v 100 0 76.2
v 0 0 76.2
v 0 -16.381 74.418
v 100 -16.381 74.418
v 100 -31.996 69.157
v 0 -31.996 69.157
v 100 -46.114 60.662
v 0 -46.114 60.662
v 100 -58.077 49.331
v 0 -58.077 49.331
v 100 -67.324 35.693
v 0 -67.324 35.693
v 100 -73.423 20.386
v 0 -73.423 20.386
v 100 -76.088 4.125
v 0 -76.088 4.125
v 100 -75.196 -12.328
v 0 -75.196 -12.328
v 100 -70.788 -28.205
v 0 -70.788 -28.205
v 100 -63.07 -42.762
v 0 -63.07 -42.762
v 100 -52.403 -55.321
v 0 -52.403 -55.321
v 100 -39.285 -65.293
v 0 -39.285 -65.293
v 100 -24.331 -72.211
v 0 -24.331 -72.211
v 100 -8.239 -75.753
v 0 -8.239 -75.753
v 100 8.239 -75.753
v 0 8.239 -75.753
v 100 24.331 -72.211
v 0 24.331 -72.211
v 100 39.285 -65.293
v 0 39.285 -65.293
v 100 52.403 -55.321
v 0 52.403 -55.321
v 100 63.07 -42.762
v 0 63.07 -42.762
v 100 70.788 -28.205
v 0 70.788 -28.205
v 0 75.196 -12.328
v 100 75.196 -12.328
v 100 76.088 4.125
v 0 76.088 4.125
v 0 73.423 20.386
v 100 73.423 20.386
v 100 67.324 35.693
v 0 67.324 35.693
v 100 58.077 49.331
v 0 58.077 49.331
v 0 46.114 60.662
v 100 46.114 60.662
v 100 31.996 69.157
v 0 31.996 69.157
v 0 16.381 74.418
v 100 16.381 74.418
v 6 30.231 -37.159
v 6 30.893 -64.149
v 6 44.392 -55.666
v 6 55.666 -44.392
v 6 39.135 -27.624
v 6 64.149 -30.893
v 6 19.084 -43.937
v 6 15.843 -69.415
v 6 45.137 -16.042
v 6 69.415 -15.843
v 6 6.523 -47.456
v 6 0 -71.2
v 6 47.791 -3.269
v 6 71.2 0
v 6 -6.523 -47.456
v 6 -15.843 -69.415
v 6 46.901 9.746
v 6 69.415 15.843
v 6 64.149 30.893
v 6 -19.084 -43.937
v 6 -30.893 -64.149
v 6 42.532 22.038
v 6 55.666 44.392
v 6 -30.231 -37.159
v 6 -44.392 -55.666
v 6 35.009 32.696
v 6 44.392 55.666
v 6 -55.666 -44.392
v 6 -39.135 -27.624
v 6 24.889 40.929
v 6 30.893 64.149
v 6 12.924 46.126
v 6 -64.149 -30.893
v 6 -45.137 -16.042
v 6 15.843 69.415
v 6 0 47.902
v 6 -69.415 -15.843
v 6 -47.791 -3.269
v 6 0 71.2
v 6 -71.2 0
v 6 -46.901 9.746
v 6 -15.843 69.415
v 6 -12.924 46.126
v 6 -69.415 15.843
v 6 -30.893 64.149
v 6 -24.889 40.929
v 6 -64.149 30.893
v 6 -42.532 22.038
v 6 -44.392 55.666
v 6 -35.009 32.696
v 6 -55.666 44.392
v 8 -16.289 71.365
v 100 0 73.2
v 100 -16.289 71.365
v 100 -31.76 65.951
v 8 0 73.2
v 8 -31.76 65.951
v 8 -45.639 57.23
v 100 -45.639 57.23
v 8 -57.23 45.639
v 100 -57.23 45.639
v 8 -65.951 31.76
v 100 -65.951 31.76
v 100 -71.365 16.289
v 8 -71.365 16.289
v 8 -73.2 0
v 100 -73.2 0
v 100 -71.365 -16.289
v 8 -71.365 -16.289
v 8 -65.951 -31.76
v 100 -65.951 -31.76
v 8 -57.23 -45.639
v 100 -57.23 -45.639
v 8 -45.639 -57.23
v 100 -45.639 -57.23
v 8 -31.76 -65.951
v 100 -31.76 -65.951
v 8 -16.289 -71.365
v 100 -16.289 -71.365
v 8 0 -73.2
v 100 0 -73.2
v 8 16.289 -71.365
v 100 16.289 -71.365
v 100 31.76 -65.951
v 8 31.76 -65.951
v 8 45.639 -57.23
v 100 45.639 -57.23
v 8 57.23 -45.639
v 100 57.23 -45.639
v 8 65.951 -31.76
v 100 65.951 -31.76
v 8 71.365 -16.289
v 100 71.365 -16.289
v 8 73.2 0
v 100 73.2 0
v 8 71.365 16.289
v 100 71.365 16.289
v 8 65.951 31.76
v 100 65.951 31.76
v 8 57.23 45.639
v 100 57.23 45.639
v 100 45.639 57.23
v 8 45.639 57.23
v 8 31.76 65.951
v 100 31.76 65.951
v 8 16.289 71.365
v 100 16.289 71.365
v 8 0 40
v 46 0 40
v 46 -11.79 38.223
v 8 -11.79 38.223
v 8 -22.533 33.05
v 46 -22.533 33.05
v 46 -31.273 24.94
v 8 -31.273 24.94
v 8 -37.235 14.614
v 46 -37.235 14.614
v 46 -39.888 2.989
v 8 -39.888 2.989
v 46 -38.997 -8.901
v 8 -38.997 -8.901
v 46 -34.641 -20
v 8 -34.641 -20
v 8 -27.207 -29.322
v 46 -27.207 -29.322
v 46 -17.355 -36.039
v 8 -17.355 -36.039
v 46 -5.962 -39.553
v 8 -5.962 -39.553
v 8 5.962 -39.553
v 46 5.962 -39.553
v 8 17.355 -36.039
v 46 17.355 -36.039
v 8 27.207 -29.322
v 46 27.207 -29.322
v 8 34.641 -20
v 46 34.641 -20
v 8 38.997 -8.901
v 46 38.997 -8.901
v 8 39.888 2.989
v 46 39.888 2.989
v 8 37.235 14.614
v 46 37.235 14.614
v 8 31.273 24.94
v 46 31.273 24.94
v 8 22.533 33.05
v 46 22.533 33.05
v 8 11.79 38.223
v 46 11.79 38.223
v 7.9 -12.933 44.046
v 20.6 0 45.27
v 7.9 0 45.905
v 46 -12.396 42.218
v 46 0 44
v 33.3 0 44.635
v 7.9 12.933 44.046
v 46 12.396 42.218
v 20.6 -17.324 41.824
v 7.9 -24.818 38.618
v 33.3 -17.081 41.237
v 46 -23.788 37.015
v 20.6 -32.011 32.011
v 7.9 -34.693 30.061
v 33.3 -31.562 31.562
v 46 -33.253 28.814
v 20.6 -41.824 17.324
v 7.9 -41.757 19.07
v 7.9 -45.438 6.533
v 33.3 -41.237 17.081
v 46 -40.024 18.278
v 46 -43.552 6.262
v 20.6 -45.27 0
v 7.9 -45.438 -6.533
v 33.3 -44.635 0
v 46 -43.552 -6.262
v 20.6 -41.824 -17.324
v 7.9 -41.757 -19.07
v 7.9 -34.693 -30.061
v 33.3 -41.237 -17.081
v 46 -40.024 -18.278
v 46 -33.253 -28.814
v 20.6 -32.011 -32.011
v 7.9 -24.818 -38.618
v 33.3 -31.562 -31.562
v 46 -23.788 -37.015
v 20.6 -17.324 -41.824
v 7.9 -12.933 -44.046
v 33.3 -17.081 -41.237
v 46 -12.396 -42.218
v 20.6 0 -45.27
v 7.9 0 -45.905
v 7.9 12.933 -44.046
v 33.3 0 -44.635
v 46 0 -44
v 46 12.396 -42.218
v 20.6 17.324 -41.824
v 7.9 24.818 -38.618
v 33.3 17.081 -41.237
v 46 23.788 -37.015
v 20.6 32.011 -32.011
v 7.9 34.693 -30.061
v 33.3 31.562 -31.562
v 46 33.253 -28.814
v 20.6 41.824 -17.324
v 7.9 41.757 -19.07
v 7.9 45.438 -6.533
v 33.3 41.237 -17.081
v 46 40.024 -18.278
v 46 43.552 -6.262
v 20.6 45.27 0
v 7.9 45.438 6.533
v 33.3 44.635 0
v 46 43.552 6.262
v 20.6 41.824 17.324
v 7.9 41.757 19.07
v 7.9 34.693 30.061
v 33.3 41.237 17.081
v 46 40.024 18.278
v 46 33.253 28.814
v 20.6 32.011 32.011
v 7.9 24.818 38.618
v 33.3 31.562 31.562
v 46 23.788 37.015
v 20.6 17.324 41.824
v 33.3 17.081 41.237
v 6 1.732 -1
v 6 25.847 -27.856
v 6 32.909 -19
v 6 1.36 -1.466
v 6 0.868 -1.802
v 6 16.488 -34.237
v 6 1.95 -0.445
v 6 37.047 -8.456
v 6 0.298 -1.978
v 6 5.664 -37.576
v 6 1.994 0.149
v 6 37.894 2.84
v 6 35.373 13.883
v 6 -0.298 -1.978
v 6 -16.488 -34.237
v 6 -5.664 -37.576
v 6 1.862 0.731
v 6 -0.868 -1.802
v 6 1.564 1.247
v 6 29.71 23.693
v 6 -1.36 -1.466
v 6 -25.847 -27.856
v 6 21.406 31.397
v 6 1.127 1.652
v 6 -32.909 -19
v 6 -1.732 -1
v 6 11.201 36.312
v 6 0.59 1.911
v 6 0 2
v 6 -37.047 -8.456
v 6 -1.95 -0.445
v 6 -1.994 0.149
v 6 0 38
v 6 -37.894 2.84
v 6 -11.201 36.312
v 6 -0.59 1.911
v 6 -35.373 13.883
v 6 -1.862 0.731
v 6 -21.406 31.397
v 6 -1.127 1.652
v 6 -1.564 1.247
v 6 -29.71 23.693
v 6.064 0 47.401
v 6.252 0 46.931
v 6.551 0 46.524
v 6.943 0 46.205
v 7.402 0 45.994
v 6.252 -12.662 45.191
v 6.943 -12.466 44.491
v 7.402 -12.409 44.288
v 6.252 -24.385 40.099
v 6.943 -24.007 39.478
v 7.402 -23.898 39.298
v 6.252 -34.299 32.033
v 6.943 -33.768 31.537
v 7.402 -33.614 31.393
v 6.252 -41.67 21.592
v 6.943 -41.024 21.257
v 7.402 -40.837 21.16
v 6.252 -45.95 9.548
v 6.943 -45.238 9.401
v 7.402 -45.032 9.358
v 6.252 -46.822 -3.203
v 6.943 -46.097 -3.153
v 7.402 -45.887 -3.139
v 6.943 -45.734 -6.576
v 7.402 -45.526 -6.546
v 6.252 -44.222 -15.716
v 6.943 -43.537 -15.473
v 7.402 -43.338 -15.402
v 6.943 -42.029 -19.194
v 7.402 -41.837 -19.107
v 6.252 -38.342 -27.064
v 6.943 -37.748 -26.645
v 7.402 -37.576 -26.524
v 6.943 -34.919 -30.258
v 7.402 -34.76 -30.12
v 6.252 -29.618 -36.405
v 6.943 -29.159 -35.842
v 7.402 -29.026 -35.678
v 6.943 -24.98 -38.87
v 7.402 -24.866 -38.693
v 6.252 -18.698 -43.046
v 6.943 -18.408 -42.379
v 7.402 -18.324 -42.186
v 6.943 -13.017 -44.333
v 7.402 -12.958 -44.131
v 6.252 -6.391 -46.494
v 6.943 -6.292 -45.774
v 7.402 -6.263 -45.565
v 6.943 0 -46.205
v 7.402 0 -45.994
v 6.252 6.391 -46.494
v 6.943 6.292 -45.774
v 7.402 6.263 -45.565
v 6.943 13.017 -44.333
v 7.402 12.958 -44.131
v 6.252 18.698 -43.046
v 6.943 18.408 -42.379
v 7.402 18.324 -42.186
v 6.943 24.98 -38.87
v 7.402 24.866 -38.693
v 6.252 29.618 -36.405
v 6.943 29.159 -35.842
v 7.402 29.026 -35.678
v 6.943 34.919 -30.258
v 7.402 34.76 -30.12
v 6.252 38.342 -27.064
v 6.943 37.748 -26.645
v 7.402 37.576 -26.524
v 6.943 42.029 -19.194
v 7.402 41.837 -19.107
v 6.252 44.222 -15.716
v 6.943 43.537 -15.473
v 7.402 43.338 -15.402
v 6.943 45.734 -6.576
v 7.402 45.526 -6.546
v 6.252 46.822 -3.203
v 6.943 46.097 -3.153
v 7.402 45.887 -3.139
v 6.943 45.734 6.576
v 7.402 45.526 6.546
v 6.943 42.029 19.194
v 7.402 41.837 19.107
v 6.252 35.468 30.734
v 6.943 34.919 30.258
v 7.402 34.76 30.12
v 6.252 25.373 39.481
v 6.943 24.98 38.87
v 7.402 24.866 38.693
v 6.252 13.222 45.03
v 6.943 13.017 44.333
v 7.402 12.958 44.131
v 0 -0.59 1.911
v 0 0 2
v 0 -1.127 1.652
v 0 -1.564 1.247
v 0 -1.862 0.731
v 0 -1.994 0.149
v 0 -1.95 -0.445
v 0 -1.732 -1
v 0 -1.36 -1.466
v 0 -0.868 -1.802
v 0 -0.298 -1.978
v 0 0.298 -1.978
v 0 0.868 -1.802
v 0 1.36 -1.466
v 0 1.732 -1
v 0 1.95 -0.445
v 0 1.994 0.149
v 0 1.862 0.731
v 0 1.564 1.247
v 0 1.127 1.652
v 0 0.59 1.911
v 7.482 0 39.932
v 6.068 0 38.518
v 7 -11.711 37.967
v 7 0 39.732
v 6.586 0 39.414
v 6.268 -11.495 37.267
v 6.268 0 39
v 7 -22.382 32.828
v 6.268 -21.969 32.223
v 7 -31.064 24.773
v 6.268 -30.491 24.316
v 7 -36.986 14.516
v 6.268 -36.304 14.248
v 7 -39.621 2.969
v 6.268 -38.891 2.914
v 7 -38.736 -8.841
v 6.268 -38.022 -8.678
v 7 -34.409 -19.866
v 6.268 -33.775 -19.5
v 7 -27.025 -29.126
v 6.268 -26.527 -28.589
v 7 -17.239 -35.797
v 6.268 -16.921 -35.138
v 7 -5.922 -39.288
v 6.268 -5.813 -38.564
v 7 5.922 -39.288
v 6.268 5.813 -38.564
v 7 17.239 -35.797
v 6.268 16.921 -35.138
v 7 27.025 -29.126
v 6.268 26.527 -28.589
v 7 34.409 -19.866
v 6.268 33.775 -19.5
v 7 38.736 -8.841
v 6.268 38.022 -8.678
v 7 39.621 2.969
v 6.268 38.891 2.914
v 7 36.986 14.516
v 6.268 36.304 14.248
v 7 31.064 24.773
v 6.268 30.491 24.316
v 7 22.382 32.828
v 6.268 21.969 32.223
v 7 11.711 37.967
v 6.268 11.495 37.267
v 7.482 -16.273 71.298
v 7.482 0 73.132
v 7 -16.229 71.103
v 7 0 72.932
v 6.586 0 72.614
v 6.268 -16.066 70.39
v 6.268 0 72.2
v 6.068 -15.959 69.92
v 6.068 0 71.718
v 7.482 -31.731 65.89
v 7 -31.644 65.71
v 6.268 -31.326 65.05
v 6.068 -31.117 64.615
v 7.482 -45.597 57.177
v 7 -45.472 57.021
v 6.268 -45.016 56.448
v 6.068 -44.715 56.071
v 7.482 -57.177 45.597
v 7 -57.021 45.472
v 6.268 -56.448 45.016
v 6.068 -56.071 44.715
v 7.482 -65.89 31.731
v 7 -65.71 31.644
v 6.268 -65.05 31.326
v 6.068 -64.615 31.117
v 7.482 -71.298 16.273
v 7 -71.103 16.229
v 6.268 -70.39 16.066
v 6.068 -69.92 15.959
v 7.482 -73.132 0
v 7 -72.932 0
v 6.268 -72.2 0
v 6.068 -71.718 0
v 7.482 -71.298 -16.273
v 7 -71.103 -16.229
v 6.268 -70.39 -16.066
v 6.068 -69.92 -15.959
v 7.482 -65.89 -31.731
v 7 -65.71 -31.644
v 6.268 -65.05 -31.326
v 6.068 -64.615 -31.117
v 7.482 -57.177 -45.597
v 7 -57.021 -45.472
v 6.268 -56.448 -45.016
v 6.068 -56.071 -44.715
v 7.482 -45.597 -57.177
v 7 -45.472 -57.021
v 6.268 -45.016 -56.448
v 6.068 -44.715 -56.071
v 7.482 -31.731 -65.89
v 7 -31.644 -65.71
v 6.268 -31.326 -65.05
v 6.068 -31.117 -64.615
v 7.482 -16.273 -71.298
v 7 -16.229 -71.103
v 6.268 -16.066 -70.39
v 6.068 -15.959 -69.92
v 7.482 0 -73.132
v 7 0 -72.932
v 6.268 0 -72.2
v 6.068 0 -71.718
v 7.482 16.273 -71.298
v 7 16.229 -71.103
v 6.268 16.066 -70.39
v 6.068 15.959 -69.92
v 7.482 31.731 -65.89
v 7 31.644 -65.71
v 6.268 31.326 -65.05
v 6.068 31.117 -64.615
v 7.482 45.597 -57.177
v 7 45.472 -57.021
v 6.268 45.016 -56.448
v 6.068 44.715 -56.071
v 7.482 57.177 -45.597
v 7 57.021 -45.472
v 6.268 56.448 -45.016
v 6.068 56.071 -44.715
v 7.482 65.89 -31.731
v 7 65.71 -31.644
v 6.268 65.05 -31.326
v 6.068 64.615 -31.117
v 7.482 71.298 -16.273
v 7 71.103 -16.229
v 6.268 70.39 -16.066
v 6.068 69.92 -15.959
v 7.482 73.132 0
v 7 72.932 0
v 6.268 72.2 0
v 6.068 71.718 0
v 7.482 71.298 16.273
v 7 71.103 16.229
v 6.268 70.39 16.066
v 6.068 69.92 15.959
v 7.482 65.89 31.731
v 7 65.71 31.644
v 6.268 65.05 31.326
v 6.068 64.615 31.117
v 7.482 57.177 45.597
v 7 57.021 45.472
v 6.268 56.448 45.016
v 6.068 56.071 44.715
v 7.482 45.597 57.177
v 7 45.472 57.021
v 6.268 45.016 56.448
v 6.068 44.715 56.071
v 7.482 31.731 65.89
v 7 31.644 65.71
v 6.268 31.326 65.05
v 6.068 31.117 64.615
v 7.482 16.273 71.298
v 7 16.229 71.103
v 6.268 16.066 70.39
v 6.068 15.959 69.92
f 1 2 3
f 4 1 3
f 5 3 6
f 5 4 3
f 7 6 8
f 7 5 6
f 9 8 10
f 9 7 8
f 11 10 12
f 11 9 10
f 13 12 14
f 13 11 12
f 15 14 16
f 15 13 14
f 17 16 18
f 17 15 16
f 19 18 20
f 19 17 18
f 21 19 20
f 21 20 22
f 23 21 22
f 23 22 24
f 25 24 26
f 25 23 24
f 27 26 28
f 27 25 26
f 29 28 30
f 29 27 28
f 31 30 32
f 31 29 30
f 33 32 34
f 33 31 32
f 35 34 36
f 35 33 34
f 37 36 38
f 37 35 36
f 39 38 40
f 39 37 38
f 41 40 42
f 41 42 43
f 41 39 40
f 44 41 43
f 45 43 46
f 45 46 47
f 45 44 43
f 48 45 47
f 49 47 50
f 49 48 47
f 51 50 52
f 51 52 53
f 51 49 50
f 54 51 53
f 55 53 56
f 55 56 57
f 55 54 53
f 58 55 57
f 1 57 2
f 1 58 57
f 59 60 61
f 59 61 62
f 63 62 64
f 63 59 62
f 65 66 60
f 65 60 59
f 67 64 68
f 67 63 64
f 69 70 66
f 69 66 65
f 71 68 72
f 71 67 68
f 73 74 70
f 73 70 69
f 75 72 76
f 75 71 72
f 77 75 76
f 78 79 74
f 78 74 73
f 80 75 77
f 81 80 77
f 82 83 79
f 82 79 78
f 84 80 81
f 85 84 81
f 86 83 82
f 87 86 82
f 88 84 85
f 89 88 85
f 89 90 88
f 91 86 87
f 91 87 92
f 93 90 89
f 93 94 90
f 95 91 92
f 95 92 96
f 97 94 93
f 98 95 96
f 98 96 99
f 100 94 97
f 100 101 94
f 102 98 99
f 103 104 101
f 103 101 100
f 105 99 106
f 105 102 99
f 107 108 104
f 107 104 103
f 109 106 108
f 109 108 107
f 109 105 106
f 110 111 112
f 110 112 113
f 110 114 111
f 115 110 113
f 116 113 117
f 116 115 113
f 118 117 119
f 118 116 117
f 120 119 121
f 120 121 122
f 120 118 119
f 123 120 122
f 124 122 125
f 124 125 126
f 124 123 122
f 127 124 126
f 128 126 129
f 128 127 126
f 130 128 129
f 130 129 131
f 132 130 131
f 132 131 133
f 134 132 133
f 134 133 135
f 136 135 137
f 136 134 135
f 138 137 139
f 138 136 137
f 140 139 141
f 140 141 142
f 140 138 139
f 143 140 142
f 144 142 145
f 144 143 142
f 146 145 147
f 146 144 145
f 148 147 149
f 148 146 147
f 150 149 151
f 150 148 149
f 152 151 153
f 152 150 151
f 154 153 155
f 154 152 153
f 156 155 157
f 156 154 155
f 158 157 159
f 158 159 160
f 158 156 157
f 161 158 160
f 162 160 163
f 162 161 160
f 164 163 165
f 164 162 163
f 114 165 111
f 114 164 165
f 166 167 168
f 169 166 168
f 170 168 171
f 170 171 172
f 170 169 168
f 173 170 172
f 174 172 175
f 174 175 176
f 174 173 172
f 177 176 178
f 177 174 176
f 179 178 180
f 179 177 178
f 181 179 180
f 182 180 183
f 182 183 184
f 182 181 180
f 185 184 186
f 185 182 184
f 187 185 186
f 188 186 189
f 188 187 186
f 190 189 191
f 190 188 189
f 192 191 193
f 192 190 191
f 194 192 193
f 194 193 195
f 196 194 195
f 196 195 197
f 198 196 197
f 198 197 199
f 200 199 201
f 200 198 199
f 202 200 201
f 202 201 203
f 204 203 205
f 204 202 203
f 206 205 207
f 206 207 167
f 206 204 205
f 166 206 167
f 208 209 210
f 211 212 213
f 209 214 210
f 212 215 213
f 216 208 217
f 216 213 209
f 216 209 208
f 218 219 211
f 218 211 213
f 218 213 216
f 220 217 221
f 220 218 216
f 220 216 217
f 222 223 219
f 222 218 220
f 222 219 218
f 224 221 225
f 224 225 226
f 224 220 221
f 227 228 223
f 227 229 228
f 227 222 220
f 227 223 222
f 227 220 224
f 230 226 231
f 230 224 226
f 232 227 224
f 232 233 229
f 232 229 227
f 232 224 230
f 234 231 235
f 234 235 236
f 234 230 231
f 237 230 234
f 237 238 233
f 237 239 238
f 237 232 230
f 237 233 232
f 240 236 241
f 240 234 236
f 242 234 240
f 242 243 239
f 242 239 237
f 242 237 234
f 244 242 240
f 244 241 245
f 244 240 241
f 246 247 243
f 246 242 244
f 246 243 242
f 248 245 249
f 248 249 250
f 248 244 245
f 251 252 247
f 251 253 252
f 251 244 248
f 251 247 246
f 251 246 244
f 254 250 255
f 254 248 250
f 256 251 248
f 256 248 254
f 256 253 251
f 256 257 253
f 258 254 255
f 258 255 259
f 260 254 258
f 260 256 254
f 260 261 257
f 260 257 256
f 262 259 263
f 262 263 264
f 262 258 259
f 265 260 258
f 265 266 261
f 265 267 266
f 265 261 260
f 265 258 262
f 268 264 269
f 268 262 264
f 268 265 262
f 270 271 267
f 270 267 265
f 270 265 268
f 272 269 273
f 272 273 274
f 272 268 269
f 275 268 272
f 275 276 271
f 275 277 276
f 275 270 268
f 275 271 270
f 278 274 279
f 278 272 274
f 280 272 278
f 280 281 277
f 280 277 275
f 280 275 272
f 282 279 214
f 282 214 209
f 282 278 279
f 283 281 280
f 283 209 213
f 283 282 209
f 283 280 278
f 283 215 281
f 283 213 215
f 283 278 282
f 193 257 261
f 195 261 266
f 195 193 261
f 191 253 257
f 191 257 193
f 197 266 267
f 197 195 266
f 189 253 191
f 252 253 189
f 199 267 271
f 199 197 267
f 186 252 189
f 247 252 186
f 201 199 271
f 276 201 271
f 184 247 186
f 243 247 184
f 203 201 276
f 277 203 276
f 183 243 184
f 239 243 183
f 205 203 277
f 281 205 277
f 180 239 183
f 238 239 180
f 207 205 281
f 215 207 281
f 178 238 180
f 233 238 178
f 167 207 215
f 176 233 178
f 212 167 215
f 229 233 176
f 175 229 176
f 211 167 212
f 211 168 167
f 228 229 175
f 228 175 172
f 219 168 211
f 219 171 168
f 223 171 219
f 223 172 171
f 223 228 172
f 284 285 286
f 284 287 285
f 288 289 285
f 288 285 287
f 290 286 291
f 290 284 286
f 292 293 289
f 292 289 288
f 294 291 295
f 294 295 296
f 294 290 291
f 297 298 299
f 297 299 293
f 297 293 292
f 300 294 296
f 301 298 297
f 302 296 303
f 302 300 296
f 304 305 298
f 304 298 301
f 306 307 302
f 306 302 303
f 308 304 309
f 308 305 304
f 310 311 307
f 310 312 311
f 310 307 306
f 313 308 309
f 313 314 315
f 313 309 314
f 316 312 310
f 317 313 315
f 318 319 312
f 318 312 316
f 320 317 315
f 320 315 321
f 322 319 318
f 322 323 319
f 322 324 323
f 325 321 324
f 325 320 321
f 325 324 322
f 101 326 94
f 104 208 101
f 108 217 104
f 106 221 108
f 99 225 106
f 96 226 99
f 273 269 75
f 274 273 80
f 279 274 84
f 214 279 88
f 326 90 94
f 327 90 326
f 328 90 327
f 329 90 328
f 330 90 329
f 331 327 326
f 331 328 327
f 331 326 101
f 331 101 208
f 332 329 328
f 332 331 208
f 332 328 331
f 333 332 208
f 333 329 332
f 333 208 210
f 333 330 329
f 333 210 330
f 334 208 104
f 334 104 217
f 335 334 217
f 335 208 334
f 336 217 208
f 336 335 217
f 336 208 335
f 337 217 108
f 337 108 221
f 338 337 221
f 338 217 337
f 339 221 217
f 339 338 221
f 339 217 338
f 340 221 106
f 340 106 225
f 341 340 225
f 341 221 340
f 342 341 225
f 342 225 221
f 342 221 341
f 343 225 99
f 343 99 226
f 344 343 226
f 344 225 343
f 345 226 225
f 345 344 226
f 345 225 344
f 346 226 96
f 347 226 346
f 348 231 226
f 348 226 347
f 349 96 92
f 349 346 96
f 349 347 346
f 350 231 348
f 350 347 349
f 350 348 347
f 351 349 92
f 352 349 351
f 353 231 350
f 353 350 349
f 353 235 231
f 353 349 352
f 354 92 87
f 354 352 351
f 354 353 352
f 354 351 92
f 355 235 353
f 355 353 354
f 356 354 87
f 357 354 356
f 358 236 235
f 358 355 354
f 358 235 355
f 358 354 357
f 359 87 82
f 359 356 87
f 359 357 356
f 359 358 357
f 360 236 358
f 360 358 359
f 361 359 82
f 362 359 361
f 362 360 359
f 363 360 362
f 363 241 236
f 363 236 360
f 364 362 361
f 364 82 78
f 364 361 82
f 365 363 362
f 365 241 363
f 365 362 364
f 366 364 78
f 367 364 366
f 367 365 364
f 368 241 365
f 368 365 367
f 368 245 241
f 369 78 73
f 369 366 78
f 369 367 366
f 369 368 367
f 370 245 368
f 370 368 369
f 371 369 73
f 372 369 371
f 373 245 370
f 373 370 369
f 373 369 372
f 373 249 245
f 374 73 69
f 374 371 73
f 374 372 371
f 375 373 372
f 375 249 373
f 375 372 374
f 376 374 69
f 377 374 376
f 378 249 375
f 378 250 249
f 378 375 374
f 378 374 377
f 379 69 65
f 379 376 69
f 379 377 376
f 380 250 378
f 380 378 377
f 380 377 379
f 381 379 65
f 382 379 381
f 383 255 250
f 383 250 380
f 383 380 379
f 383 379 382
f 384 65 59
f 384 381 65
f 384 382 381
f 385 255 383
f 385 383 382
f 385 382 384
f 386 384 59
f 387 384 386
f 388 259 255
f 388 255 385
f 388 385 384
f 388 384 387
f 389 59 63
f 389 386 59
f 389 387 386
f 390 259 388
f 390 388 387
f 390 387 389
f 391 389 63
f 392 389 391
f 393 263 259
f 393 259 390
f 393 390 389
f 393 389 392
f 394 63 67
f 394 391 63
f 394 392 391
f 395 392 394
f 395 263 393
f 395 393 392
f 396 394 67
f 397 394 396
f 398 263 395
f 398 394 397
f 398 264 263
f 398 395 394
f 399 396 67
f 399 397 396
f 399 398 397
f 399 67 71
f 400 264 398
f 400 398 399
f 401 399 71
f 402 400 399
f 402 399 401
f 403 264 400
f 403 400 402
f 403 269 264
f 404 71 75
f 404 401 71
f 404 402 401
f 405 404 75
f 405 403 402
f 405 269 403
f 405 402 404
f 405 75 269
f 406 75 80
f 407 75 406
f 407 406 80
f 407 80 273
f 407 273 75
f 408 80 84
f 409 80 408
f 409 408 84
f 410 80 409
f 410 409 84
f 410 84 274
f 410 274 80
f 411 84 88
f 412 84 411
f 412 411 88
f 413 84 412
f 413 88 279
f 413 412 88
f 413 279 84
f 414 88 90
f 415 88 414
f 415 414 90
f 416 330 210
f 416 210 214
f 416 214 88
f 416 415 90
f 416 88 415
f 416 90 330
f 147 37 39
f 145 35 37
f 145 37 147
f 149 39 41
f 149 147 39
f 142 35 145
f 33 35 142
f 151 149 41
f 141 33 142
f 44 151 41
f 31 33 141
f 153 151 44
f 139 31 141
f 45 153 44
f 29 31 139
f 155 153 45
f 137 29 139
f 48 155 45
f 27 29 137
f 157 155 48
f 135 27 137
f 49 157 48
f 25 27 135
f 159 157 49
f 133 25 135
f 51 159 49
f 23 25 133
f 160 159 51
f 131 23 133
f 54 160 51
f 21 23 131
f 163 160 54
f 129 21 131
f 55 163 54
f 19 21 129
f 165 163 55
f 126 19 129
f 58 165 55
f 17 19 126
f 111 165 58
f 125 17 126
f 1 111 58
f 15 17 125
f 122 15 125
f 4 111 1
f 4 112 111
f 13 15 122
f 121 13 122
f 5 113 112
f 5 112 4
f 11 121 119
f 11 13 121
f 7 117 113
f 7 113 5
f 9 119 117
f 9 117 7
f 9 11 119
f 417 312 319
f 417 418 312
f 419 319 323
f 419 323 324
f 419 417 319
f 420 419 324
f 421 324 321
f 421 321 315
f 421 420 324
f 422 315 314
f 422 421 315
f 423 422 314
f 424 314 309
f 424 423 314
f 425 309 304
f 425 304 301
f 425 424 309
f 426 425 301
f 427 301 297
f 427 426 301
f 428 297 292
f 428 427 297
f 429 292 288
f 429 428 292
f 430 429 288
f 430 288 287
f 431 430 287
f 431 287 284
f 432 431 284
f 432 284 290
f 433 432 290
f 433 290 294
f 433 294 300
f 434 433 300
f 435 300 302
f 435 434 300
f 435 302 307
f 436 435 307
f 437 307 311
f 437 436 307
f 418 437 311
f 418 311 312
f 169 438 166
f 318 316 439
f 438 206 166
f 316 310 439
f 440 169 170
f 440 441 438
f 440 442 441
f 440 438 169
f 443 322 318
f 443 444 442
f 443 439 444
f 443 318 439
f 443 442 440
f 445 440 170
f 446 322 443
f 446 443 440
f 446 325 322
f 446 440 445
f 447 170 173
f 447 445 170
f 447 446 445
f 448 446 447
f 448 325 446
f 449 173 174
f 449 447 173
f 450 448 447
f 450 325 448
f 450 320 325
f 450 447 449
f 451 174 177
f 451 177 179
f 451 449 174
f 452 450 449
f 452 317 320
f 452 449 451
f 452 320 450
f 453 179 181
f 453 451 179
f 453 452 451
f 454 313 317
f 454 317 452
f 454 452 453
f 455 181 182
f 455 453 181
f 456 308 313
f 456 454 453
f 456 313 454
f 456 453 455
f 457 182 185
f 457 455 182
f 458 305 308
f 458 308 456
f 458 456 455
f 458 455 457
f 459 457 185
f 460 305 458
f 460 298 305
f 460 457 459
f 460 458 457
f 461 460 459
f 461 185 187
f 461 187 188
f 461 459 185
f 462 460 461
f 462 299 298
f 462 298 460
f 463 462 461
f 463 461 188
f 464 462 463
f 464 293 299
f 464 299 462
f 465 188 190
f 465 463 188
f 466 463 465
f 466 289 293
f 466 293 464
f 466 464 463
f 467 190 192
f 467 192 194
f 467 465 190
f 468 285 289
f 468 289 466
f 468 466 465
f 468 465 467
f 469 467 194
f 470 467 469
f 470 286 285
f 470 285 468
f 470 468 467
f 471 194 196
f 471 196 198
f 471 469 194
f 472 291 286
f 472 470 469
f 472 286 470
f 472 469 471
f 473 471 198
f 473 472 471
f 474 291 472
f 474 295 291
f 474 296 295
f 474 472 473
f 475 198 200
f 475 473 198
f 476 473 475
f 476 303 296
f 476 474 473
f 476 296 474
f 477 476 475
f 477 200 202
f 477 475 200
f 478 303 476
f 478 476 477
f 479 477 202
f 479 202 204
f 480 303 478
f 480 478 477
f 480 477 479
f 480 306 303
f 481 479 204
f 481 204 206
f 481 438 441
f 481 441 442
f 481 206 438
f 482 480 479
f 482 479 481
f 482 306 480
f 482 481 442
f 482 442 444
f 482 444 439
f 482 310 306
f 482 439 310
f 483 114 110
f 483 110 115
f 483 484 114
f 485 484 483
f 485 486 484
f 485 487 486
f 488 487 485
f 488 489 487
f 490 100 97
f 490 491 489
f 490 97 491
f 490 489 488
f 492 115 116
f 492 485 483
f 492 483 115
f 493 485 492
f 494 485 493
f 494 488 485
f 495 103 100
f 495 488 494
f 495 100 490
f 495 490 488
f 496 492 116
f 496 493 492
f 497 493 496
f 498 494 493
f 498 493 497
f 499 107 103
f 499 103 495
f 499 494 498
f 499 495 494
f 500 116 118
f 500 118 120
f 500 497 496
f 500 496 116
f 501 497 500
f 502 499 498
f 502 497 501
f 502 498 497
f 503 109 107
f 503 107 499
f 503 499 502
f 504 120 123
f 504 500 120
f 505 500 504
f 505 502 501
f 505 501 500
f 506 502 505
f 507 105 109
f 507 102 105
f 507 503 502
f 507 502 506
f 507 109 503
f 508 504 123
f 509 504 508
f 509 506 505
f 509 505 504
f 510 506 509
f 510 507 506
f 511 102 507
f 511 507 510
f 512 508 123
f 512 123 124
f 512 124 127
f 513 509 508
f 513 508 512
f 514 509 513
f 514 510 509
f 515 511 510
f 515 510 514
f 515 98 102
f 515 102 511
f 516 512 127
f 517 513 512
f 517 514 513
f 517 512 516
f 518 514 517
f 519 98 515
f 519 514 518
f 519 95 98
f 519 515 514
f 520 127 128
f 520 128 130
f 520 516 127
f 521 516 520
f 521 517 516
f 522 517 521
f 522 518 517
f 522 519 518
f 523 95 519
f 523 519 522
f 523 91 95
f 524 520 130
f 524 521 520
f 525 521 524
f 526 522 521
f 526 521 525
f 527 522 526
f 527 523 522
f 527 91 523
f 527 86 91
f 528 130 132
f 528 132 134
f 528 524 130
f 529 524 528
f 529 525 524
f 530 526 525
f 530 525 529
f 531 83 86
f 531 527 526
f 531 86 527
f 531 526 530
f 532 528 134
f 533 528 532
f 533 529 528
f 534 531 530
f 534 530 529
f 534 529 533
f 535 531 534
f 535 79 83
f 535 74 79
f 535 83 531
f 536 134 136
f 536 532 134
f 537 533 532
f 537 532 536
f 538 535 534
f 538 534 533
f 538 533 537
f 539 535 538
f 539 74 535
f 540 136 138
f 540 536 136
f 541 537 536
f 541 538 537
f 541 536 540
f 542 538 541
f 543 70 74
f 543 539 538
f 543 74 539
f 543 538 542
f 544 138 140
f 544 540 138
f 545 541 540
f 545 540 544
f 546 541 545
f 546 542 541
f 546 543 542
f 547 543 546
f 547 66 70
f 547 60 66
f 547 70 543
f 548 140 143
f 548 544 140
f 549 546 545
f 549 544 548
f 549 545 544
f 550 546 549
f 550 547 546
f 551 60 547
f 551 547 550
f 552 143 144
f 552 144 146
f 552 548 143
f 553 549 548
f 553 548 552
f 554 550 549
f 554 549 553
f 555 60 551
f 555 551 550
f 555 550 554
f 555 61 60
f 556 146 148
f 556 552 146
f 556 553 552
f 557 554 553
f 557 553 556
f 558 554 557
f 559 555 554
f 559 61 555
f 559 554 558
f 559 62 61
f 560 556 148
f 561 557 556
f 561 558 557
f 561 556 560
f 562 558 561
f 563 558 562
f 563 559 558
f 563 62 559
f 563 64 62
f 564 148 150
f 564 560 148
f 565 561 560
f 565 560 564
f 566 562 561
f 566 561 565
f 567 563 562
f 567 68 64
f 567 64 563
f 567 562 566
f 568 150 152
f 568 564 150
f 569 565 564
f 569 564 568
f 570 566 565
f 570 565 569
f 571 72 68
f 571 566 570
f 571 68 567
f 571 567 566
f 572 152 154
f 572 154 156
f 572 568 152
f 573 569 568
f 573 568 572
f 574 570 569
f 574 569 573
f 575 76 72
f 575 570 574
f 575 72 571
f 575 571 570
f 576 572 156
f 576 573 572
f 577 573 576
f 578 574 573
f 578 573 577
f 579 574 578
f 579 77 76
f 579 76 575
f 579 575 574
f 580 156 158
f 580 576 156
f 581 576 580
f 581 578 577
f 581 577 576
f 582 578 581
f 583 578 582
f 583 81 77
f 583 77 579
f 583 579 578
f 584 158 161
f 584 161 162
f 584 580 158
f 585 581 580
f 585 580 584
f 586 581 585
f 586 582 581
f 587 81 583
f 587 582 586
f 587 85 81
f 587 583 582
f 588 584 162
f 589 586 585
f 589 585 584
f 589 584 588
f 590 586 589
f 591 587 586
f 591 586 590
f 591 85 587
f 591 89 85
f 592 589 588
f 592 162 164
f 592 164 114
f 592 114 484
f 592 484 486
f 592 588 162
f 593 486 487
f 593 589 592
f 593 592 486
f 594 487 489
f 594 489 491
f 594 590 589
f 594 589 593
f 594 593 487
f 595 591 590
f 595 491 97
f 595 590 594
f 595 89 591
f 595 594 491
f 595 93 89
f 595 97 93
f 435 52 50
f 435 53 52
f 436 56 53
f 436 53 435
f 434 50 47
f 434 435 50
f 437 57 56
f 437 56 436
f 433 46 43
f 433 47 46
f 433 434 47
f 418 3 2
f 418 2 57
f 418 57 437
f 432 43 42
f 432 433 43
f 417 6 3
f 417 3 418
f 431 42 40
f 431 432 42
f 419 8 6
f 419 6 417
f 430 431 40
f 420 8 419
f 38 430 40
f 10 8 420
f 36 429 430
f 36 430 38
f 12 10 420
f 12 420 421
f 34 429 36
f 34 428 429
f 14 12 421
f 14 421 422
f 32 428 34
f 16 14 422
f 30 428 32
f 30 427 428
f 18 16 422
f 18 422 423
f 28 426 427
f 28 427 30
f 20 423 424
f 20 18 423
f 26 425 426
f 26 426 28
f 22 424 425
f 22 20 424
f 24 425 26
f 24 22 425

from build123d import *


with BuildPart() as part:
    # Sketch2 → Revolve1 (revolve)
    with BuildSketch(Plane.XY, mode=Mode.PRIVATE) as revolve1_sk:
        with BuildLine():
            Line((7.900124766, 45.904993762), (46, 44))
            Line((46, 44), (46, 40))
            Line((46, 40), (8, 40))
            ThreePointArc((8, 40), (6.585786438, 39.414213562), (6, 38))
            Line((6, 38), (6, 2))
            Line((6, 2), (0, 2))
            Line((0, 2), (0, 76.2))
            Line((0, 76.2), (6.299212598, 76.2))
            Line((6.299212598, 76.2), (100, 76.2))
            Line((100, 76.2), (100, 73.2))
            Line((100, 73.2), (8, 73.2))
            ThreePointArc((8, 73.2), (6.585786438, 72.614213562), (6, 71.2))
            Line((6, 71.2), (6, 47.902498439))
            ThreePointArc((6, 47.902498439), (6.550905374, 46.524048308), (7.900124766, 45.904993762))
        make_face()
    revolve(revolve1_sk.sketch.rotate(Axis((0, 0, 0), (1, 0, 0)), 90), axis=Axis((0, 0, 0), (1, 0, 0)))


solid = part.part
